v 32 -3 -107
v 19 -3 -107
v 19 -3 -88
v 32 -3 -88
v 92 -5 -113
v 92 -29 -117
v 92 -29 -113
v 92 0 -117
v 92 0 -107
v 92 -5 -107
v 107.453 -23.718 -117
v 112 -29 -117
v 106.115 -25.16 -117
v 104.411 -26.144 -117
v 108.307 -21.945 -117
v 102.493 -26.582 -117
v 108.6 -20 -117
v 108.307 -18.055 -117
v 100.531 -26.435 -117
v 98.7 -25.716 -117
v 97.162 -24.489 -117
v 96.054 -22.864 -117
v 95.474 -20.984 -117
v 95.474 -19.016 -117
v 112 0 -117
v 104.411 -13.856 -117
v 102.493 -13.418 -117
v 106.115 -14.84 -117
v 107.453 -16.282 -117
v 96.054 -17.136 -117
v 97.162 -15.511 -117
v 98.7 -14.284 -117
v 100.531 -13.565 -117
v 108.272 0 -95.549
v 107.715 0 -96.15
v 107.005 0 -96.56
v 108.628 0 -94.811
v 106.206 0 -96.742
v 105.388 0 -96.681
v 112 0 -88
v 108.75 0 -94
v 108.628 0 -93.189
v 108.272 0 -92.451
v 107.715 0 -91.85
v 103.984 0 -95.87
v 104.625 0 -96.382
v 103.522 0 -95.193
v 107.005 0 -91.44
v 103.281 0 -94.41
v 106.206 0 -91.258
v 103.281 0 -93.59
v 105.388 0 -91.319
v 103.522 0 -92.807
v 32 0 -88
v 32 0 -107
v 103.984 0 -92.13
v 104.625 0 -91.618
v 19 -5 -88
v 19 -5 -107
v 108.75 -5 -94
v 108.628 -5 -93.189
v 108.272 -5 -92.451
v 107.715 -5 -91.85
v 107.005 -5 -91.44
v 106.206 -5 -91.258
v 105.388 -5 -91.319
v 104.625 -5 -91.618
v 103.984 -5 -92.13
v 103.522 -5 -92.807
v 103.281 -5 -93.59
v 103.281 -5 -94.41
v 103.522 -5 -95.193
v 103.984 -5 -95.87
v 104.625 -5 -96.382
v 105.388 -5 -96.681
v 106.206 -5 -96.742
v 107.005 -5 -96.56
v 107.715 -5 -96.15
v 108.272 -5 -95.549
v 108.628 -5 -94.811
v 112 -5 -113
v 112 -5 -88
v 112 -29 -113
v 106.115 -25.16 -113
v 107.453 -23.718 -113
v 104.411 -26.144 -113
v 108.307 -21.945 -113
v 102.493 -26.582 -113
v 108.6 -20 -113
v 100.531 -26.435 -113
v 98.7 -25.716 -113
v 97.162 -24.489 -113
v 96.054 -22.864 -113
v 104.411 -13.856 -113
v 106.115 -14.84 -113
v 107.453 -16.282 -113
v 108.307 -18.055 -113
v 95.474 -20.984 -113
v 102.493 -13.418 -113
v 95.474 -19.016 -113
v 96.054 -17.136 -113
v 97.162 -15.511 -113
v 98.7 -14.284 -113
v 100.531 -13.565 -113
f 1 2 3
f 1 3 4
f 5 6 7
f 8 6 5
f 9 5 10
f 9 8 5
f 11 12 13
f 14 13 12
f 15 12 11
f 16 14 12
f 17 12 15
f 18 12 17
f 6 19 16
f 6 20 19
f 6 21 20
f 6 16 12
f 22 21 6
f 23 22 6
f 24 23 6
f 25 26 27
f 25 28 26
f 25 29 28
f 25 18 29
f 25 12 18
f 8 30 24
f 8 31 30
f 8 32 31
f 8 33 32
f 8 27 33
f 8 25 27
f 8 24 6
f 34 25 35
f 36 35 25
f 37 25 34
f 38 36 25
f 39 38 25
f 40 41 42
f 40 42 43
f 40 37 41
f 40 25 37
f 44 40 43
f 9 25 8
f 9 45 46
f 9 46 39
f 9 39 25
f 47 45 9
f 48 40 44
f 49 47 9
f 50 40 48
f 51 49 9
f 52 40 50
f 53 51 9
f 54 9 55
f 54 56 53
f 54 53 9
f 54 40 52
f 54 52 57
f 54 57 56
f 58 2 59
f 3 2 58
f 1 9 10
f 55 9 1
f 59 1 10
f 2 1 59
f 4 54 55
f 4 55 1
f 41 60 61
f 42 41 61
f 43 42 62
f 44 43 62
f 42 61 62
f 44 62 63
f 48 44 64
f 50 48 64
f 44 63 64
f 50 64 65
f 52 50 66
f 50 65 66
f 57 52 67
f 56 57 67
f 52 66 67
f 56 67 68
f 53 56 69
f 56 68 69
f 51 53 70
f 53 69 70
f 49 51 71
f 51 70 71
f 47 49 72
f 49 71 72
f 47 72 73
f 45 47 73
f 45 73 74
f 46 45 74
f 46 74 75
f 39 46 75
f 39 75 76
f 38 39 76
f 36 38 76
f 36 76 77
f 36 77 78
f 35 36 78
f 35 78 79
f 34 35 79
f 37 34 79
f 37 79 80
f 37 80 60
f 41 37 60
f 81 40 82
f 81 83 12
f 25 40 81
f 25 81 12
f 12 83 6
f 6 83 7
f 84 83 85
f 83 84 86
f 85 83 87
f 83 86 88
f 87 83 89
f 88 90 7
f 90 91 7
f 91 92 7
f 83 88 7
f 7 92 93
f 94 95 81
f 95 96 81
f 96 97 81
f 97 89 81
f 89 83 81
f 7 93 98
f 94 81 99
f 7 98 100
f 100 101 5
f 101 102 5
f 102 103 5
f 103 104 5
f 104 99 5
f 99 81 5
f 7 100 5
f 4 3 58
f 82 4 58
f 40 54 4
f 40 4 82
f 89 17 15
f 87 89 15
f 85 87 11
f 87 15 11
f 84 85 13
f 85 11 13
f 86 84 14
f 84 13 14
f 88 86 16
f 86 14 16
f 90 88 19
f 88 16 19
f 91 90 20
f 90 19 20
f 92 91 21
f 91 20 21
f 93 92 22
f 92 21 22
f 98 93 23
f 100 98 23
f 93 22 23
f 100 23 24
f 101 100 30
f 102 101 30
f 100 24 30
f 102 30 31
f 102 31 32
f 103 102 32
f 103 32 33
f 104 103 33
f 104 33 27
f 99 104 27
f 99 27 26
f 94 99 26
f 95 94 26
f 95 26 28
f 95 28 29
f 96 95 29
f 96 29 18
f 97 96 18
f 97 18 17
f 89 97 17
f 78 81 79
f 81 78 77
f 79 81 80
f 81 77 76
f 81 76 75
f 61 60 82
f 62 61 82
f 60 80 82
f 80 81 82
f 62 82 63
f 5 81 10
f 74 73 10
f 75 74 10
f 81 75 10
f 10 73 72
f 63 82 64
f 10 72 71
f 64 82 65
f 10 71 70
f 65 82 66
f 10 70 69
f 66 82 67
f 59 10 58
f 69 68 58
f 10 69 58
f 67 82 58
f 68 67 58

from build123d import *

# Parameters (mm, degrees)
SKETCH001_W   = 20
SKETCH001_H   = 4
PAD001_DEPTH  = 29
SKETCH002_R   = 6.6
HOLE_DEPTH    = 4.001001
SKETCH004_W   = 13
SKETCH004_H   = 3
PAD002_DEPTH  = 19
PAD_DEPTH     = 5
SKETCH003_R   = 2.75
HOLE001_DEPTH = 5.001


with BuildPart() as body001:
    # Sketch001 (on Face1 of CopyPad) → Pad001 (new body)
    with BuildSketch(Plane(origin=(0, 0, 0), x_dir=(-1, 0, 0), z_dir=(0, 1, 0))):
        with Locations((-102, -115)):
            Rectangle(SKETCH001_W, SKETCH001_H)
    extrude(amount=-PAD001_DEPTH)

    # Sketch002 (on Face3 of Pad001) → Hole (cut, through all)
    with BuildSketch(Plane(origin=(0, 3e-06, -117), x_dir=(1, 0, 0), z_dir=(0, 0, -1))):
        with Locations((102, 20)):
            Circle(SKETCH002_R)
    extrude(amount=-HOLE_DEPTH, mode=Mode.SUBTRACT)


with BuildPart() as body002:
    # Sketch004 (on Face1 of CopyHole001) → Pad002 (new body)
    with BuildSketch(Plane(origin=(0, 0, -107), x_dir=(1, 0, 0), z_dir=(0, 0, -1))):
        with Locations((25.5, 39.5)):
            Rectangle(SKETCH004_W, SKETCH004_H)
    extrude(amount=-PAD002_DEPTH)


with BuildPart() as body002_1:
    # Body002 placement: moved
    add(body002.part.moved(Location((0, 38, 0))))


with BuildPart() as body:
    # Sketch → Pad (new body)
    with BuildSketch(Plane.XZ):
        Polygon((19, -88), (112, -88), (112, -117), (92, -117), (92, -107), (19, -107), align=None)
    extrude(amount=PAD_DEPTH)

    # Sketch003 (on Face8 of Pad) → Hole001 (cut, through all)
    with BuildSketch(Plane.XZ.offset(5)):
        with Locations((106, -94)):
            Circle(SKETCH003_R)
    extrude(amount=-HOLE001_DEPTH, mode=Mode.SUBTRACT)

    # Boolean: union Body001
    add(body001.part)

    # Boolean001: cut Body002
    add(body002_1.part, mode=Mode.SUBTRACT)


solid = body.part
